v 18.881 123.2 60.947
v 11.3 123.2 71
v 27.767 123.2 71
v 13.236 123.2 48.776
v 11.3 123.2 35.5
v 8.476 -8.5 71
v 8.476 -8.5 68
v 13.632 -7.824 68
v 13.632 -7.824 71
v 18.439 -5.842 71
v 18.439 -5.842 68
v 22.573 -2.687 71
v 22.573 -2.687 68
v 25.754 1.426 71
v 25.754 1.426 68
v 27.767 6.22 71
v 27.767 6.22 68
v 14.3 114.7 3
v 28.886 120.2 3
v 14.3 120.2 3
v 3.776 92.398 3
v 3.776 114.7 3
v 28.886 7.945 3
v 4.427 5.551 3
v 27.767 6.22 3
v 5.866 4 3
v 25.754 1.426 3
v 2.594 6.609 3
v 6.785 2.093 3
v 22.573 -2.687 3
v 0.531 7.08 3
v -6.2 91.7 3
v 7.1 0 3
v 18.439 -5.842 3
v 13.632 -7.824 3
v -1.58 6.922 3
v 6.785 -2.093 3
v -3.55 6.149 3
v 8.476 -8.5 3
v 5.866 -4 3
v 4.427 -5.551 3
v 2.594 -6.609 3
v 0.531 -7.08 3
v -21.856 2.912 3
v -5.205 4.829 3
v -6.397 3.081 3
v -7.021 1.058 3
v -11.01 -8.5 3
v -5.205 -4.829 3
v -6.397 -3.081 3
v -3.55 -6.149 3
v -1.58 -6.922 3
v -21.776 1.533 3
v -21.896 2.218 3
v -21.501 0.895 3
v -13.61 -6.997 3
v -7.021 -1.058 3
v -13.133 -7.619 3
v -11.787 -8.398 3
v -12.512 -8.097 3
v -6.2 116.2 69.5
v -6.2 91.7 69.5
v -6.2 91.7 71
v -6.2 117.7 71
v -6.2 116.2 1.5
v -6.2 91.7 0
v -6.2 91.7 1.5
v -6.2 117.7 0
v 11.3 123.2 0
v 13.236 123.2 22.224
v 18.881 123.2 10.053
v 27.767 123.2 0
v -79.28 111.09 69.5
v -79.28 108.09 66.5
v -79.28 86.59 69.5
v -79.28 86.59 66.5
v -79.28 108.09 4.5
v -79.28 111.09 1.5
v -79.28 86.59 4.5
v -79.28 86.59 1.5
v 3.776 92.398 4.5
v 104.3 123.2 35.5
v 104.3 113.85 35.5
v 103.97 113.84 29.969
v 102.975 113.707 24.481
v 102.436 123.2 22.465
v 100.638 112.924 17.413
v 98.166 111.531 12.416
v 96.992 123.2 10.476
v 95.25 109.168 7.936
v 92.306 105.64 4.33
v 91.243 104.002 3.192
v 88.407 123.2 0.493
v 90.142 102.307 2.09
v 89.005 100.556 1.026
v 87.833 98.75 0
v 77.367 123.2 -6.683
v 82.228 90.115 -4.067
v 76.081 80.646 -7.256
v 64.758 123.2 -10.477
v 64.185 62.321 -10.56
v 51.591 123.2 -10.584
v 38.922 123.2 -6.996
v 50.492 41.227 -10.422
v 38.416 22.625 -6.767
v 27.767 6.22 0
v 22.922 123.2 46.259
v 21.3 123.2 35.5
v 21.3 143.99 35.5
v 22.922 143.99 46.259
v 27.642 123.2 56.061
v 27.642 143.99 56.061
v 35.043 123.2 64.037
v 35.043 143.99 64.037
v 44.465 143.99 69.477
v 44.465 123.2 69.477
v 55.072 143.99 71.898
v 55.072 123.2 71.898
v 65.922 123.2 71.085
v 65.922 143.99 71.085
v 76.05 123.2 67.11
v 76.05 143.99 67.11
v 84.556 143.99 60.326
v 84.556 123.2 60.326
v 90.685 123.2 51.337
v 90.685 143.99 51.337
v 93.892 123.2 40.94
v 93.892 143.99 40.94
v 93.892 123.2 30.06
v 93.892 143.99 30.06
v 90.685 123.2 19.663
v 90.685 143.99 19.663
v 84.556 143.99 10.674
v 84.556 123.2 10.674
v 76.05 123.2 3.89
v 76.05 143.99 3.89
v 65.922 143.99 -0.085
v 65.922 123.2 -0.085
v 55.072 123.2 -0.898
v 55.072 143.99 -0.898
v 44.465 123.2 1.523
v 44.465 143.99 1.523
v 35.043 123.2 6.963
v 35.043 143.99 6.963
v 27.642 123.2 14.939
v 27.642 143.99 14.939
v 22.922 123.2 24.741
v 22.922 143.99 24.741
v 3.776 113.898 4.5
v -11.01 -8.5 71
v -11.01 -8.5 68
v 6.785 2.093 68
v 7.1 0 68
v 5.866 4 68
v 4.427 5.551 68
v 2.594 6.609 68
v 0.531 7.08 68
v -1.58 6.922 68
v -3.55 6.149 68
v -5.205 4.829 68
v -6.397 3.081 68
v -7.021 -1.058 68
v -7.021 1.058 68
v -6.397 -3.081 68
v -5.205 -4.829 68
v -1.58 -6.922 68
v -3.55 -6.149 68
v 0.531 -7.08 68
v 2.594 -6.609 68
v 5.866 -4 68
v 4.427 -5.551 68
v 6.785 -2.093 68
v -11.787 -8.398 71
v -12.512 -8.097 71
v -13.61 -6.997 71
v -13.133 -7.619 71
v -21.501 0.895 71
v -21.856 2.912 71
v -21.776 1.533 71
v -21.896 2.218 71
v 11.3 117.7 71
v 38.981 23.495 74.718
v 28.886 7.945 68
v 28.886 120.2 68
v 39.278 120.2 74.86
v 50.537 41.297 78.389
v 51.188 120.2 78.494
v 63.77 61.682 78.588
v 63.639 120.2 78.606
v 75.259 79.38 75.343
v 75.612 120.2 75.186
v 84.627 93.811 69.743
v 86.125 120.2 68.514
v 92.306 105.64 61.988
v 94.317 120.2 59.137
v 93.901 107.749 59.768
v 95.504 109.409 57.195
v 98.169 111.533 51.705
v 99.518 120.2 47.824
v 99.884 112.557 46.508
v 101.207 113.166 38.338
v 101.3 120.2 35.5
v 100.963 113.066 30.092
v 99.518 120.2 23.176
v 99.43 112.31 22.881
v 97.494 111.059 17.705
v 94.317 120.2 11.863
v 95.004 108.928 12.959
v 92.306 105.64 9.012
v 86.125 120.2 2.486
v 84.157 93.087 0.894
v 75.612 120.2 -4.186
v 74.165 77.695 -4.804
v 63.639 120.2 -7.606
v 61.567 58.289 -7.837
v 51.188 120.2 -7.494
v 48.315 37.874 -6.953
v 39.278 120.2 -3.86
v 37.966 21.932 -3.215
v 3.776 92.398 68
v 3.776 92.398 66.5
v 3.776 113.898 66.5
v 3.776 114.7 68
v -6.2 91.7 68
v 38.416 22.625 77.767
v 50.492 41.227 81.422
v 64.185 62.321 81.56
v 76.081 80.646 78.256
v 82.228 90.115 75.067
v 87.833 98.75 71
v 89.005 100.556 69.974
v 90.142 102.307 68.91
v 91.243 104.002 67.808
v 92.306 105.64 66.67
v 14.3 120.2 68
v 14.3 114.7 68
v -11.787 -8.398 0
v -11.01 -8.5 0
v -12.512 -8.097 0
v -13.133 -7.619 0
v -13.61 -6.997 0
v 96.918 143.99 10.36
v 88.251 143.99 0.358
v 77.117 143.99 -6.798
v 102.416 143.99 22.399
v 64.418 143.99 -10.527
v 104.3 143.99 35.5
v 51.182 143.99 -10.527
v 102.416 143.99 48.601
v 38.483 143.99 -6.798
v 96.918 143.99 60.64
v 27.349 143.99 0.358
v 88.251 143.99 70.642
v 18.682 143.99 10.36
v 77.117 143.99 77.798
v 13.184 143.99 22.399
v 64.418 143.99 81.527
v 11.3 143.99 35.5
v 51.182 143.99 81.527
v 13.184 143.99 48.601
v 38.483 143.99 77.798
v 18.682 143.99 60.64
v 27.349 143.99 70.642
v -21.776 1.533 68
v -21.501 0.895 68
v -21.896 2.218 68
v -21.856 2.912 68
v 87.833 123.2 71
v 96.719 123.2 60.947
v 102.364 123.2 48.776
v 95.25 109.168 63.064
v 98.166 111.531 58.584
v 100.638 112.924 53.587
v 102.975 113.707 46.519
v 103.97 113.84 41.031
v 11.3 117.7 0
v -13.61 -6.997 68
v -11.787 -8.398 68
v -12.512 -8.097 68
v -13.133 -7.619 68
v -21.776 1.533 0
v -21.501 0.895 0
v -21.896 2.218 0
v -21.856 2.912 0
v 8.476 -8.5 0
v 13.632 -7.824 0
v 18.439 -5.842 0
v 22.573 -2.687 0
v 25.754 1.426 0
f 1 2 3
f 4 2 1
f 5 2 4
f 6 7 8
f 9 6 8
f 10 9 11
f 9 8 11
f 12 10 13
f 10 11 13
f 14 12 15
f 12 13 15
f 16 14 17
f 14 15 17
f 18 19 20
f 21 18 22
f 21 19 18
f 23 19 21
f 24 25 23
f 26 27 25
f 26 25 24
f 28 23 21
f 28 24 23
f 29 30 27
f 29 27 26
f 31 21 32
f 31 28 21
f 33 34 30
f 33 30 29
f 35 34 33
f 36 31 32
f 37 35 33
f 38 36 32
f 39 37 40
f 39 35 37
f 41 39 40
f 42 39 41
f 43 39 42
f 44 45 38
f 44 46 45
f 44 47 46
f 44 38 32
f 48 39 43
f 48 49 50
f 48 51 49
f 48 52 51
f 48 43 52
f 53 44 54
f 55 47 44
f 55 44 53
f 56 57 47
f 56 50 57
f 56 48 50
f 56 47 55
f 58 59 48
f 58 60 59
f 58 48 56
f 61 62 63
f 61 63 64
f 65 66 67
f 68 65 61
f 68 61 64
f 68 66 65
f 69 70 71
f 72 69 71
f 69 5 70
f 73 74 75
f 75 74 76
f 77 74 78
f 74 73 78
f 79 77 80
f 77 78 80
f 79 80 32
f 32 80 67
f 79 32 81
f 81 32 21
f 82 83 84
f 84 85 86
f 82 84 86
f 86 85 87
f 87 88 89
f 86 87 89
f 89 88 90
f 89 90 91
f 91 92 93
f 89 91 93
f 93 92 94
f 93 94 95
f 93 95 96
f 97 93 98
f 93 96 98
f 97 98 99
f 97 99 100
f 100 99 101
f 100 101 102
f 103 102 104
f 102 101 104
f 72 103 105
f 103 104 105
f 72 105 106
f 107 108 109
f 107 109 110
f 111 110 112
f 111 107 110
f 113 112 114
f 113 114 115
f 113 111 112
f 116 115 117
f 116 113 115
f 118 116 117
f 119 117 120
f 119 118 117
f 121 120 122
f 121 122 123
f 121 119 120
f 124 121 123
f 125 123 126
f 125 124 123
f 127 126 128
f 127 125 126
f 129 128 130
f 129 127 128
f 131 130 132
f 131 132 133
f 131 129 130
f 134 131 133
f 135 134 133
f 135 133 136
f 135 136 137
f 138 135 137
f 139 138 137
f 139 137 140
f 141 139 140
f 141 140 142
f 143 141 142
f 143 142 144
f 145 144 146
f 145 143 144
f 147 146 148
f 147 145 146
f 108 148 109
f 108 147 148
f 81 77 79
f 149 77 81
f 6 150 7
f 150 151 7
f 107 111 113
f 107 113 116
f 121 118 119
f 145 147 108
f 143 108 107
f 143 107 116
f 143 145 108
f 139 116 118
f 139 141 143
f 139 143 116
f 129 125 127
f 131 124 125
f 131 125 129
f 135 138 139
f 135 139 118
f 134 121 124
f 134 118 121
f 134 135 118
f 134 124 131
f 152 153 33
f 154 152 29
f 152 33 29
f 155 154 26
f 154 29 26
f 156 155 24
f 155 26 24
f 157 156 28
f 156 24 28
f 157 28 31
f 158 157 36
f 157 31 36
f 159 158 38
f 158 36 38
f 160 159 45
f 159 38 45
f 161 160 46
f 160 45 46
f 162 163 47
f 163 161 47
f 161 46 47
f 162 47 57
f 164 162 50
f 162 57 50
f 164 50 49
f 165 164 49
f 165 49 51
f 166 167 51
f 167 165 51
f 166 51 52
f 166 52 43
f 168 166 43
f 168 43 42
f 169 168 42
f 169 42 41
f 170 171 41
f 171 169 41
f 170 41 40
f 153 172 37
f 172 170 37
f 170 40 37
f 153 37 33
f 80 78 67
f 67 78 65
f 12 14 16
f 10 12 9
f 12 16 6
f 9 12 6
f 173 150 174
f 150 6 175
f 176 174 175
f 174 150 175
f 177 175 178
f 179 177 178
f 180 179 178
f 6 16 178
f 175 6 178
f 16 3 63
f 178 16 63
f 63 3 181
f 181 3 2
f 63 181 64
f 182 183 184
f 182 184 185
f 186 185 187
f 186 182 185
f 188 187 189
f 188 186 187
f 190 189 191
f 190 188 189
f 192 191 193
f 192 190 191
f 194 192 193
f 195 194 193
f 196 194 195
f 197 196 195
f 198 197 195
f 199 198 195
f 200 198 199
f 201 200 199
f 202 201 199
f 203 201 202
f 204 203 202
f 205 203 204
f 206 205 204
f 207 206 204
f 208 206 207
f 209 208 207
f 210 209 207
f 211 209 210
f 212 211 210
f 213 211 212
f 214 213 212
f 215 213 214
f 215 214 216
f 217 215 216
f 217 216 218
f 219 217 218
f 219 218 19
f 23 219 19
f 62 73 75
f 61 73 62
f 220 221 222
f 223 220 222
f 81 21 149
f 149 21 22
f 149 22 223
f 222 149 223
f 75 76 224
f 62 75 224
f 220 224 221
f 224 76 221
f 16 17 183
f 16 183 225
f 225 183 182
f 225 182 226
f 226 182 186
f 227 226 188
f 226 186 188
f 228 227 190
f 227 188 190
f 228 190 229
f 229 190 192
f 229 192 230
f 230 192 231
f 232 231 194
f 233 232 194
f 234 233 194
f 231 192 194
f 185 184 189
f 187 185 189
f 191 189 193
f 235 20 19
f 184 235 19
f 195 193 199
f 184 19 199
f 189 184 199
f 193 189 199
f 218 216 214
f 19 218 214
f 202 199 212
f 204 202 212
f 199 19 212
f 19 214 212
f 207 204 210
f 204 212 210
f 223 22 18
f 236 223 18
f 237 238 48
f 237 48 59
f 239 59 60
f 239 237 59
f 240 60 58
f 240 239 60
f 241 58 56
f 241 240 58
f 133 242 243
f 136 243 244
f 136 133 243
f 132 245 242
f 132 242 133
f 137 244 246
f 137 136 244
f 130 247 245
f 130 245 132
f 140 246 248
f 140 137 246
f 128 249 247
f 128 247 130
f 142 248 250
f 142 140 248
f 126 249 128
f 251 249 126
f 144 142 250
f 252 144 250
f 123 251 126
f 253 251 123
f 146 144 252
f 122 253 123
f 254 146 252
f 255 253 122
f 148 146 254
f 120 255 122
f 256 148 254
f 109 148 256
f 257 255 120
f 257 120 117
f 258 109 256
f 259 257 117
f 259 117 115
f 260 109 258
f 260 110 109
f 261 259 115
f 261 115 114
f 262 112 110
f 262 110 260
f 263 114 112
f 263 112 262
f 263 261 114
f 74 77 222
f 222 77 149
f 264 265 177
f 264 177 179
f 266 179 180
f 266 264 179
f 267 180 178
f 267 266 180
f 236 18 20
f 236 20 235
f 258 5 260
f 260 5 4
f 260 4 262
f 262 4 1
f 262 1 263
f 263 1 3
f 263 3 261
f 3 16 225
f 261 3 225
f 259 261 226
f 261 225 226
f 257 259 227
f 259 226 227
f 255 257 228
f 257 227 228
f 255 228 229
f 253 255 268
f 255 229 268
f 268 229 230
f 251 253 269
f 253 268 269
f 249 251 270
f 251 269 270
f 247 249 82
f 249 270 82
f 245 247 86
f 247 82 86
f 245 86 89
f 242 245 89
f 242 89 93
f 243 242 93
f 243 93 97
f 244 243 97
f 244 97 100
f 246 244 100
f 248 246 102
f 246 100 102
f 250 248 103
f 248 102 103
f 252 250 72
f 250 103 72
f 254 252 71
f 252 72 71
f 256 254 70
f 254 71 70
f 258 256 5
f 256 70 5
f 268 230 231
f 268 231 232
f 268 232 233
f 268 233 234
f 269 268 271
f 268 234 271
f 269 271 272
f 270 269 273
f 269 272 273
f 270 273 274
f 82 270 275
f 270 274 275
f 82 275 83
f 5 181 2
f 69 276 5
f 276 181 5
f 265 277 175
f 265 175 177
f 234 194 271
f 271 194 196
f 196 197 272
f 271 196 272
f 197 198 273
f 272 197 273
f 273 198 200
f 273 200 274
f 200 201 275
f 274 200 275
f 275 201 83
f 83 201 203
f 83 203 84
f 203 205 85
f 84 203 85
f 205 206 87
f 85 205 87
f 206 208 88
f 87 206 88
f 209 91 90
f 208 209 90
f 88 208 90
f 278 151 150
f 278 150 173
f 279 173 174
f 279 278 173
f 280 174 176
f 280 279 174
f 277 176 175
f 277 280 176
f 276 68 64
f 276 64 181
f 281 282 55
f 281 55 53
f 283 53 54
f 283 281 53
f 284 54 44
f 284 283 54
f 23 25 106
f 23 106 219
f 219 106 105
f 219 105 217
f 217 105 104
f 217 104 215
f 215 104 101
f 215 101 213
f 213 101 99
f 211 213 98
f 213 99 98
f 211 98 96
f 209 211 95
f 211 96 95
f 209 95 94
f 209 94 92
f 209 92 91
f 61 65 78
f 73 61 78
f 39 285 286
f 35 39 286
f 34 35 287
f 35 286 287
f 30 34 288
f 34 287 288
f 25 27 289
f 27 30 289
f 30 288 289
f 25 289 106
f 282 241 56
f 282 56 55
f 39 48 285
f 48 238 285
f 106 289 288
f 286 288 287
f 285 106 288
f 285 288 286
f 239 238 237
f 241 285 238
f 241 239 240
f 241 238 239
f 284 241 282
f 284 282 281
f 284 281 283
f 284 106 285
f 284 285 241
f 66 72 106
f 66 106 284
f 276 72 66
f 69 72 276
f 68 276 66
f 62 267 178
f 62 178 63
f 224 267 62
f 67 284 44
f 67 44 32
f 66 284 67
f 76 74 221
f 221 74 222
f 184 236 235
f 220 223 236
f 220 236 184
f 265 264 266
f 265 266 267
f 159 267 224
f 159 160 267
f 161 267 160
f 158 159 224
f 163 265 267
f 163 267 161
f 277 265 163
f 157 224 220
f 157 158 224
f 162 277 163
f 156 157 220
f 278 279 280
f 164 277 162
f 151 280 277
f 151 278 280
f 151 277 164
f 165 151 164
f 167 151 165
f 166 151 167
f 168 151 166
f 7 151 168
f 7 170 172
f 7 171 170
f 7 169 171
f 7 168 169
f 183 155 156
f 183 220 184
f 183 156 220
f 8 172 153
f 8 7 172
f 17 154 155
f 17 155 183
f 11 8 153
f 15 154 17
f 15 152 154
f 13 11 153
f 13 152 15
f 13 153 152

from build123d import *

# Parameters (mm, degrees)
ESTRUSIONE_ESTRUSIONE1_DEPTH         = 71
ESTRUSIONE_ESTRUSIONE5_START         = -131.7
SCHIZZO8_R                           = 46.5
ESTRUSIONE_ESTRUSIONE5_DEPTH         = 131.7
TAGLIO_ESTRUSIONE1_REACH             = 183.054
TAGLIO_ESTRUSIONE1_DIRECTION_2_REACH = 183.054
RACCORDO1_R                          = 20
TAGLIO_ESTRUSIONE2_REACH             = 188.942
SVUOTA1_START                        = -8.5
SVUOTA1_DEPTH                        = 123.2
SVUOTA1_START_2                      = 114.7
SVUOTA1_2_DEPTH                      = 5.5
ESTRUSIONE_ESTRUSIONE7_START         = 1.5
ESTRUSIONE_ESTRUSIONE7_DEPTH         = 68
ESTRUSIONE_ESTRUSIONE7_2_DEPTH       = 3
ESTRUSIONE_ESTRUSIONE7_START_2       = 66.5
ESTRUSIONE_ESTRUSIONE7_3_DEPTH       = 3
SCHIZZO15_R                          = 46.5
SCHIZZO15_R_2                        = 36.5
ESTRUSIONE_ESTRUSIONE8_DEPTH         = 20.79
ESTRUSIONE_ESTRUSIONE9_REACH         = 196.557
SCHIZZO16_R                          = 7.1


# Read off the part's stored shape, not the designer's step: Svuota1, Estrusione-Estrusione7
with BuildPart() as part:
    # Schizzo1 → Estrusione-Estrusione1 (new body)
    with BuildSketch(Plane.XY):
        with BuildLine():
            Line((11.3, 123.2), (104.3, 123.2))
            Line((104.3, 123.2), (104.3, 113.85))
            Line((104.3, 113.85), (24.875337306, -8.5))
            Line((24.875337306, -8.5), (-11.01, -8.5))
            ThreePointArc((-11.01, -8.5), (-12.511694022, -8.09709743), (-13.610030458, -6.996610042))
            Line((-13.610030458, -6.996610042), (-21.501342136, 0.894701636))
            ThreePointArc((-21.501342136, 0.894701636), (-21.856035983, 1.872259448), (-21.855688892, 2.912176215))
            Line((-21.855688892, 2.912176215), (-6.2, 91.7))
            Line((-6.2, 91.7), (-6.2, 117.7))
            Line((-6.2, 117.7), (11.3, 117.7))
            Line((11.3, 117.7), (11.3, 123.2))
        make_face()
    extrude(amount=ESTRUSIONE_ESTRUSIONE1_DEPTH)

    # Schizzo8 → Estrusione-Estrusione5 (add)
    with BuildSketch(Plane(origin=(0, 123.2, 0), x_dir=(1, 0, 0), z_dir=(0, 1, 0)).offset(ESTRUSIONE_ESTRUSIONE5_START)):
        with Locations((57.8, -35.5)):
            Circle(SCHIZZO8_R)
    extrude(amount=ESTRUSIONE_ESTRUSIONE5_DEPTH)

    # Schizzo9 → Taglio-Estrusione1 (cut, up to next)
    with BuildSketch(Plane.XY, mode=Mode.PRIVATE) as taglio_estrusione1_sk1:
        with BuildLine():
            Line((27.766685165, 6.220424861), (92.30584512, 105.64))
            add(Edge.make_bspline(
                [(92.30584512, 105.64), (97.635444472, 113.85), (104.3, 113.85)],
                knots=[0, 0, 0, 1, 1, 1], degree=2, weights=[1, 0.701406821, 1]))
            Line((104.3, 113.85), (104.3, -8.5))
            Line((104.3, -8.5), (27.766685165, -8.5))
            Line((27.766685165, -8.5), (27.766685165, 6.220424861))
        make_face()
    taglio_estrusione1_tool1 = extrude(taglio_estrusione1_sk1.sketch, amount=TAGLIO_ESTRUSIONE1_REACH, mode=Mode.PRIVATE) & part.part
    add(taglio_estrusione1_tool1.solids().sort_by_distance((76.036213, 35.53967, 0))[0], mode=Mode.SUBTRACT)

    # Schizzo9 → Taglio-Estrusione1 direction 2 (cut, up to next)
    with BuildSketch(Plane.XY, mode=Mode.PRIVATE) as taglio_estrusione1_direction_2_sk1:
        with BuildLine():
            Line((27.766685165, 6.220424861), (92.30584512, 105.64))
            add(Edge.make_bspline(
                [(92.30584512, 105.64), (97.635444472, 113.85), (104.3, 113.85)],
                knots=[0, 0, 0, 1, 1, 1], degree=2, weights=[1, 0.701406821, 1]))
            Line((104.3, 113.85), (104.3, -8.5))
            Line((104.3, -8.5), (27.766685165, -8.5))
            Line((27.766685165, -8.5), (27.766685165, 6.220424861))
        make_face()
    taglio_estrusione1_direction_2_tool1 = extrude(taglio_estrusione1_direction_2_sk1.sketch, amount=-TAGLIO_ESTRUSIONE1_DIRECTION_2_REACH, mode=Mode.PRIVATE) & part.part
    add(taglio_estrusione1_direction_2_tool1.solids().sort_by_distance((76.036213, 35.53967, 0))[0], mode=Mode.SUBTRACT)

    # Raccordo1
    # the kernel refuses this fillet: 20 mm, written as the material it takes off along each edge
    with BuildSketch(Plane(origin=(27.766685165, -8.5, -48.226424704), x_dir=(-1, 0, 0), z_dir=(0, 0, 1))) as raccordo1_piece_1:
        with BuildLine():
            CenterArc((19.290569882, -20), RACCORDO1_R, 90, 74.693720794)
            Line((0, -14.720424861), (-0.385811398, -14.614833358))
            ThreePointArc((-0.385811398, -14.614833358), (-0.4, -7.360212431), (-0.4, 0))
            Line((-0.4, 0), (0, 0.4))
            Line((0, 0.4), (19.290569882, 0.4))
            Line((19.290569882, 0.4), (19.290569882, 0))
        make_face()
    extrude(amount=167.452849408, mode=Mode.SUBTRACT)

    # Schizzo10 → Taglio-Estrusione2 (cut, up to next)
    with BuildSketch(Plane(origin=(0, 123.2, 0), x_dir=(1, 0, 0), z_dir=(0, 1, 0)), mode=Mode.PRIVATE) as taglio_estrusione2_sk1:
        with BuildLine():
            Line((104.3, 0), (87.833314835, 0))
            ThreePointArc((87.833314835, 0), (99.982929872, -15.933435984), (104.3, -35.500000151))
            Line((104.3, -35.500000151), (104.3, 0))
        make_face()
    taglio_estrusione2_tool1 = extrude(taglio_estrusione2_sk1.sketch, amount=-TAGLIO_ESTRUSIONE2_REACH, mode=Mode.PRIVATE) & part.part
    # Schizzo10 → Taglio-Estrusione2 (cut, up to next)
    with BuildSketch(Plane(origin=(0, 123.2, 0), x_dir=(1, 0, 0), z_dir=(0, 1, 0)), mode=Mode.PRIVATE) as taglio_estrusione2_sk2:
        with BuildLine():
            Line((104.3, -71), (104.3, -35.500000151))
            ThreePointArc((104.3, -35.500000151), (99.982929809, -55.066564153), (87.833314835, -71))
            Line((87.833314835, -71), (104.3, -71))
        make_face()
    taglio_estrusione2_tool2 = extrude(taglio_estrusione2_sk2.sketch, amount=-TAGLIO_ESTRUSIONE2_REACH, mode=Mode.PRIVATE) & part.part
    add(taglio_estrusione2_tool1.solids().sort_by_distance((99.557164, 123.2, 8.530088))[0], mode=Mode.SUBTRACT)
    add(taglio_estrusione2_tool2.solids().sort_by_distance((99.557164, 123.2, 62.469912))[0], mode=Mode.SUBTRACT)

    # Svuota1 outline → Svuota1 (cut)
    with BuildSketch(Plane(origin=(0, 0, 0), x_dir=(1, 0, 0), z_dir=(0, 1, 0)).offset(SVUOTA1_START)):
        with BuildLine():
            ThreePointArc((28.88633541, -68), (101.3, -35.5), (28.88633541, -3))
            Line((28.88633541, -3), (-23, -3))
            Line((-23, -3), (-23, -68))
            Line((-23, -68), (28.88633541, -68))
        make_face()
    extrude(amount=SVUOTA1_DEPTH, mode=Mode.SUBTRACT)

    # Svuota1 2 outline → Svuota1 2 (cut)
    with BuildSketch(Plane(origin=(0, 0, 0), x_dir=(1, 0, 0), z_dir=(0, 1, 0)).offset(SVUOTA1_START_2)):
        with BuildLine():
            Line((14.3, -3), (14.3, -68))
            Line((14.3, -68), (28.88633541, -68))
            ThreePointArc((28.88633541, -68), (101.3, -35.5), (28.88633541, -3))
            Line((28.88633541, -3), (14.3, -3))
        make_face()
    extrude(amount=SVUOTA1_2_DEPTH, mode=Mode.SUBTRACT)

    # Estrusione-Estrusione7 outline → Estrusione-Estrusione7 (add)
    with BuildSketch(Plane.XY.offset(ESTRUSIONE_ESTRUSIONE7_START)):
        Polygon((-6.2, 114.7), (-6.2, 116.2), (-79.280324347, 111.089725903), (-79.280324347, 108.089725903), (3.775640503, 113.897564737), (3.775640503, 114.7), align=None)
    extrude(amount=ESTRUSIONE_ESTRUSIONE7_DEPTH)

    # Estrusione-Estrusione7 2 outline → Estrusione-Estrusione7 2 (add)
    with BuildSketch(Plane.XY.offset(ESTRUSIONE_ESTRUSIONE7_START)):
        Polygon((-79.280324347, 108.089725903), (-79.280324347, 86.589725903), (3.775640503, 92.397564737), (3.775640503, 113.897564737), align=None)
    extrude(amount=ESTRUSIONE_ESTRUSIONE7_2_DEPTH)

    # Estrusione-Estrusione7 3 outline → Estrusione-Estrusione7 3 (add)
    with BuildSketch(Plane.XY.offset(ESTRUSIONE_ESTRUSIONE7_START_2)):
        Polygon((-79.280324347, 108.089725903), (-79.280324347, 86.589725903), (3.775640503, 92.397564737), (3.775640503, 113.897564737), align=None)
    extrude(amount=ESTRUSIONE_ESTRUSIONE7_3_DEPTH)

    # Schizzo15 → Estrusione-Estrusione8 (add)
    with BuildSketch(Plane(origin=(0, 123.2, 0), x_dir=(1, 0, 0), z_dir=(0, 1, 0))):
        with Locations(Location((57.8, -35.5, 0), (0, 0, 180))):
            Circle(SCHIZZO15_R)
        with Locations(Location((57.8, -35.5, 0), (0, 0, 180))):
            Circle(SCHIZZO15_R_2, mode=Mode.SUBTRACT)
    extrude(amount=ESTRUSIONE_ESTRUSIONE8_DEPTH)

    # Schizzo16 → Estrusione-Estrusione9 (add, up to next)
    with BuildSketch(Plane.XY.offset(3), mode=Mode.PRIVATE) as estrusione_estrusione9_sk1:
        Circle(SCHIZZO16_R)
    estrusione_estrusione9_tool1 = extrude(estrusione_estrusione9_sk1.sketch, amount=ESTRUSIONE_ESTRUSIONE9_REACH, mode=Mode.PRIVATE) - part.part
    add(estrusione_estrusione9_tool1.solids().sort_by_distance((0, 0, 3))[0])


solid = part.part
